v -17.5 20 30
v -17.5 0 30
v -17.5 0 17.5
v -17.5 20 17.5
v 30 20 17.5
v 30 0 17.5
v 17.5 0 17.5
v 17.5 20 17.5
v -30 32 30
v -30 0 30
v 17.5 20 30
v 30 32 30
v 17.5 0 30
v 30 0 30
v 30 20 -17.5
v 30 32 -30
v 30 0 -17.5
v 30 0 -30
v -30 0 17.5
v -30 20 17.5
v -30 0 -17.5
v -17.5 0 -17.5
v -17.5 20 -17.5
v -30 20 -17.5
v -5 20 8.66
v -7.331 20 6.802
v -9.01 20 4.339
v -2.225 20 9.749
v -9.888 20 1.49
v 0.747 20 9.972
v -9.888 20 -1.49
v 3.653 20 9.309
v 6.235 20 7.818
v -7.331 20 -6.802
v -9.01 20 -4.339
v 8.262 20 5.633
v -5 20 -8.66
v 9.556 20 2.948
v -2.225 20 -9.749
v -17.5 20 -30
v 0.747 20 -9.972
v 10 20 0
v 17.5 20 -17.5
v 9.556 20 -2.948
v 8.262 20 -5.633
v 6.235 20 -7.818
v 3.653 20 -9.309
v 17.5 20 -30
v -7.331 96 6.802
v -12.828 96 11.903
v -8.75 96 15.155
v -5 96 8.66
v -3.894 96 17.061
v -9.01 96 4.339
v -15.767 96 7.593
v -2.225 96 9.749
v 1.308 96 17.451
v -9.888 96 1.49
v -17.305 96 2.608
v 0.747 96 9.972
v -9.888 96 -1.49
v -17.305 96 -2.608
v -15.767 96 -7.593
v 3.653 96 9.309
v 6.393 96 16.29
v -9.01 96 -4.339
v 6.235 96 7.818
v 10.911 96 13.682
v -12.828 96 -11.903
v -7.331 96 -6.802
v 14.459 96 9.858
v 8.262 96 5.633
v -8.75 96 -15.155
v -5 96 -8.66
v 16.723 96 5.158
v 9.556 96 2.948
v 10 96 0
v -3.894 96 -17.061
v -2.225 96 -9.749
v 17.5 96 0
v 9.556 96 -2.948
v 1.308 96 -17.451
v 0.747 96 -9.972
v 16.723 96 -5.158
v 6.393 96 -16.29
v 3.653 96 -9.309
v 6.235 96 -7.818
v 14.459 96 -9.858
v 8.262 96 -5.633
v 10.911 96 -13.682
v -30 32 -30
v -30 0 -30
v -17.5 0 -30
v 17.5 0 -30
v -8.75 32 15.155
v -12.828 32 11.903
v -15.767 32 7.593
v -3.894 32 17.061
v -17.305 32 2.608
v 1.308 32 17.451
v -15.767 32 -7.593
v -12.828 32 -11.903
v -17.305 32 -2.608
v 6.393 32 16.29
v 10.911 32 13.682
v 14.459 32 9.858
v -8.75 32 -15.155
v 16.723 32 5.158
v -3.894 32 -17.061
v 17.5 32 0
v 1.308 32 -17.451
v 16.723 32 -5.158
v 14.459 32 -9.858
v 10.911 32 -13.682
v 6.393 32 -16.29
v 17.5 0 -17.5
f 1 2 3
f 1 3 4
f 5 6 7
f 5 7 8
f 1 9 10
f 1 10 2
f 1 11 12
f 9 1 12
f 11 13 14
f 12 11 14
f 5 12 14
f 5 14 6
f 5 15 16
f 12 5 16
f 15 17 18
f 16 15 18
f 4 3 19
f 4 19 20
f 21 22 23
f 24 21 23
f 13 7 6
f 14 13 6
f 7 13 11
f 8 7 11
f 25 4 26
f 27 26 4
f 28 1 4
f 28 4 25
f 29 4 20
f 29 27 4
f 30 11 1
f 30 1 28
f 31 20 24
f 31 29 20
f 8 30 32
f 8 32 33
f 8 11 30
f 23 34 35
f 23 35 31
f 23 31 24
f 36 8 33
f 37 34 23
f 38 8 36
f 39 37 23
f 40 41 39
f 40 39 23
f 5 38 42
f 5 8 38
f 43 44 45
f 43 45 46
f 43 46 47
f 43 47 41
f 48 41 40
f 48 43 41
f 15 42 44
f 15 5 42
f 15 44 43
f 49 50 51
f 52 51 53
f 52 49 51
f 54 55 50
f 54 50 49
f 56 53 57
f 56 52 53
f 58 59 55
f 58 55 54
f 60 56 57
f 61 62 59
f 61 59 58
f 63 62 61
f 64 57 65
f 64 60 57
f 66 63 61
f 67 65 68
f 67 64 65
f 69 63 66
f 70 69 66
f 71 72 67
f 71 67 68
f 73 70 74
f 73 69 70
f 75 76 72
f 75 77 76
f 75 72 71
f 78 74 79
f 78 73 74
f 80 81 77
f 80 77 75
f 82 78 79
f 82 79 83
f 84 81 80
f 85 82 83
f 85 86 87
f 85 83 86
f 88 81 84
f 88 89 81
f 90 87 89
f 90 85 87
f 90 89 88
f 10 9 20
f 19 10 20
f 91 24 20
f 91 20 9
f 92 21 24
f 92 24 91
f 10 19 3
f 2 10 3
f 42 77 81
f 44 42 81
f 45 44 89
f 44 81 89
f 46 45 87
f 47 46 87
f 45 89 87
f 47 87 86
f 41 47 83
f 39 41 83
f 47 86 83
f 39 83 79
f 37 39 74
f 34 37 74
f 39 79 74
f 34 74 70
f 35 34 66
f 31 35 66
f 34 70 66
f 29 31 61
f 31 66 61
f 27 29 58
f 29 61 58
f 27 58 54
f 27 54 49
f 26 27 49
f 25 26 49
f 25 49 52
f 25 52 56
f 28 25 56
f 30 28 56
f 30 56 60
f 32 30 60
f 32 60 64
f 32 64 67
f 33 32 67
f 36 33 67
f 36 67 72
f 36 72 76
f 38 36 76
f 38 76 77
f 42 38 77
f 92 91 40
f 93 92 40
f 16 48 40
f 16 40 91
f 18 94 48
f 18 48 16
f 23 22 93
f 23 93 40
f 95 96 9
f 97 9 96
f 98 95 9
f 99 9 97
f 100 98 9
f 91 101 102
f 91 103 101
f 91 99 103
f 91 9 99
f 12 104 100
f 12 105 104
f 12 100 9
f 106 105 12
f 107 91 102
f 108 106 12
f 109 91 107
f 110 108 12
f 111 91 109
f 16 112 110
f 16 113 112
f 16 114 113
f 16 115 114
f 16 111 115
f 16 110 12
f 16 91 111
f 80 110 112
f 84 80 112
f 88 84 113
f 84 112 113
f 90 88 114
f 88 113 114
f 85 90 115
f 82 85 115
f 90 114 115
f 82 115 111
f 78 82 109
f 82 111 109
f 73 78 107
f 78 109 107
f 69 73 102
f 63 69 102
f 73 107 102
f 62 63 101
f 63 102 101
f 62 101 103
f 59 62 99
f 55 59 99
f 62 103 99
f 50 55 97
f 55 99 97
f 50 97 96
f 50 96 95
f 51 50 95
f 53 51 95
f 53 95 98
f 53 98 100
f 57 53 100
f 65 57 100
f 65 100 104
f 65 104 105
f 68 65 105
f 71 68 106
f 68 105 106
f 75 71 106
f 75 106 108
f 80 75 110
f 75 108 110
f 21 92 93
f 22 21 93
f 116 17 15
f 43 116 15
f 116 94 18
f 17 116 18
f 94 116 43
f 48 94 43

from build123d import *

# Parameters (mm, degrees)
SKETCH2_W               = 60
SKETCH2_H               = 60
BOSS_EXTRUDE2_DEPTH     = 32
SKETCH3_W               = 35
SKETCH3_H               = 20
CUT_EXTRUDE1_DEPTH      = 60
SKETCH4_W               = 35
SKETCH4_H               = 20
CUT_EXTRUDE2_DEPTH      = 61
SKETCH5_R               = 17.5
BOSS_EXTRUDE3_DEPTH     = 64
SKETCH6_R               = 10
CUT_EXTRUDE3_DEPTH      = 1
CUT_EXTRUDE3_DEPTH_BACK = 97


with BuildPart() as part:
    # Sketch2 → Boss-Extrude2 (new body)
    with BuildSketch(Plane(origin=(0, 0, 0), x_dir=(1, 0, 0), z_dir=(0, 1, 0))):
        Rectangle(SKETCH2_W, SKETCH2_H)
    extrude(amount=BOSS_EXTRUDE2_DEPTH)

    # Sketch3 → Cut-Extrude1 (cut)
    with BuildSketch(Plane.XY.offset(30)):
        with Locations((0, 10)):
            Rectangle(SKETCH3_W, SKETCH3_H)
    extrude(amount=-CUT_EXTRUDE1_DEPTH, mode=Mode.SUBTRACT)

    # Sketch4 → Cut-Extrude2 (cut, through all)
    with BuildSketch(Plane(origin=(30, 0, 0), x_dir=(0, 0, -1), z_dir=(1, 0, 0))):
        with Locations((0, 10)):
            Rectangle(SKETCH4_W, SKETCH4_H)
    extrude(amount=-CUT_EXTRUDE2_DEPTH, mode=Mode.SUBTRACT)

    # Sketch5 → Boss-Extrude3 (add)
    with BuildSketch(Plane(origin=(0, 32, 0), x_dir=(1, 0, 0), z_dir=(0, 1, 0))):
        Circle(SKETCH5_R)
    extrude(amount=BOSS_EXTRUDE3_DEPTH)

    # Sketch6 → Cut-Extrude3 (cut, two sides)
    with BuildSketch(Plane(origin=(0, 96, 0), x_dir=(1, 0, 0), z_dir=(0, 1, 0))) as cut_extrude3_sk:
        Circle(SKETCH6_R)
    extrude(amount=CUT_EXTRUDE3_DEPTH, mode=Mode.SUBTRACT)
    extrude(cut_extrude3_sk.sketch, amount=-CUT_EXTRUDE3_DEPTH_BACK, mode=Mode.SUBTRACT)


solid = part.part
